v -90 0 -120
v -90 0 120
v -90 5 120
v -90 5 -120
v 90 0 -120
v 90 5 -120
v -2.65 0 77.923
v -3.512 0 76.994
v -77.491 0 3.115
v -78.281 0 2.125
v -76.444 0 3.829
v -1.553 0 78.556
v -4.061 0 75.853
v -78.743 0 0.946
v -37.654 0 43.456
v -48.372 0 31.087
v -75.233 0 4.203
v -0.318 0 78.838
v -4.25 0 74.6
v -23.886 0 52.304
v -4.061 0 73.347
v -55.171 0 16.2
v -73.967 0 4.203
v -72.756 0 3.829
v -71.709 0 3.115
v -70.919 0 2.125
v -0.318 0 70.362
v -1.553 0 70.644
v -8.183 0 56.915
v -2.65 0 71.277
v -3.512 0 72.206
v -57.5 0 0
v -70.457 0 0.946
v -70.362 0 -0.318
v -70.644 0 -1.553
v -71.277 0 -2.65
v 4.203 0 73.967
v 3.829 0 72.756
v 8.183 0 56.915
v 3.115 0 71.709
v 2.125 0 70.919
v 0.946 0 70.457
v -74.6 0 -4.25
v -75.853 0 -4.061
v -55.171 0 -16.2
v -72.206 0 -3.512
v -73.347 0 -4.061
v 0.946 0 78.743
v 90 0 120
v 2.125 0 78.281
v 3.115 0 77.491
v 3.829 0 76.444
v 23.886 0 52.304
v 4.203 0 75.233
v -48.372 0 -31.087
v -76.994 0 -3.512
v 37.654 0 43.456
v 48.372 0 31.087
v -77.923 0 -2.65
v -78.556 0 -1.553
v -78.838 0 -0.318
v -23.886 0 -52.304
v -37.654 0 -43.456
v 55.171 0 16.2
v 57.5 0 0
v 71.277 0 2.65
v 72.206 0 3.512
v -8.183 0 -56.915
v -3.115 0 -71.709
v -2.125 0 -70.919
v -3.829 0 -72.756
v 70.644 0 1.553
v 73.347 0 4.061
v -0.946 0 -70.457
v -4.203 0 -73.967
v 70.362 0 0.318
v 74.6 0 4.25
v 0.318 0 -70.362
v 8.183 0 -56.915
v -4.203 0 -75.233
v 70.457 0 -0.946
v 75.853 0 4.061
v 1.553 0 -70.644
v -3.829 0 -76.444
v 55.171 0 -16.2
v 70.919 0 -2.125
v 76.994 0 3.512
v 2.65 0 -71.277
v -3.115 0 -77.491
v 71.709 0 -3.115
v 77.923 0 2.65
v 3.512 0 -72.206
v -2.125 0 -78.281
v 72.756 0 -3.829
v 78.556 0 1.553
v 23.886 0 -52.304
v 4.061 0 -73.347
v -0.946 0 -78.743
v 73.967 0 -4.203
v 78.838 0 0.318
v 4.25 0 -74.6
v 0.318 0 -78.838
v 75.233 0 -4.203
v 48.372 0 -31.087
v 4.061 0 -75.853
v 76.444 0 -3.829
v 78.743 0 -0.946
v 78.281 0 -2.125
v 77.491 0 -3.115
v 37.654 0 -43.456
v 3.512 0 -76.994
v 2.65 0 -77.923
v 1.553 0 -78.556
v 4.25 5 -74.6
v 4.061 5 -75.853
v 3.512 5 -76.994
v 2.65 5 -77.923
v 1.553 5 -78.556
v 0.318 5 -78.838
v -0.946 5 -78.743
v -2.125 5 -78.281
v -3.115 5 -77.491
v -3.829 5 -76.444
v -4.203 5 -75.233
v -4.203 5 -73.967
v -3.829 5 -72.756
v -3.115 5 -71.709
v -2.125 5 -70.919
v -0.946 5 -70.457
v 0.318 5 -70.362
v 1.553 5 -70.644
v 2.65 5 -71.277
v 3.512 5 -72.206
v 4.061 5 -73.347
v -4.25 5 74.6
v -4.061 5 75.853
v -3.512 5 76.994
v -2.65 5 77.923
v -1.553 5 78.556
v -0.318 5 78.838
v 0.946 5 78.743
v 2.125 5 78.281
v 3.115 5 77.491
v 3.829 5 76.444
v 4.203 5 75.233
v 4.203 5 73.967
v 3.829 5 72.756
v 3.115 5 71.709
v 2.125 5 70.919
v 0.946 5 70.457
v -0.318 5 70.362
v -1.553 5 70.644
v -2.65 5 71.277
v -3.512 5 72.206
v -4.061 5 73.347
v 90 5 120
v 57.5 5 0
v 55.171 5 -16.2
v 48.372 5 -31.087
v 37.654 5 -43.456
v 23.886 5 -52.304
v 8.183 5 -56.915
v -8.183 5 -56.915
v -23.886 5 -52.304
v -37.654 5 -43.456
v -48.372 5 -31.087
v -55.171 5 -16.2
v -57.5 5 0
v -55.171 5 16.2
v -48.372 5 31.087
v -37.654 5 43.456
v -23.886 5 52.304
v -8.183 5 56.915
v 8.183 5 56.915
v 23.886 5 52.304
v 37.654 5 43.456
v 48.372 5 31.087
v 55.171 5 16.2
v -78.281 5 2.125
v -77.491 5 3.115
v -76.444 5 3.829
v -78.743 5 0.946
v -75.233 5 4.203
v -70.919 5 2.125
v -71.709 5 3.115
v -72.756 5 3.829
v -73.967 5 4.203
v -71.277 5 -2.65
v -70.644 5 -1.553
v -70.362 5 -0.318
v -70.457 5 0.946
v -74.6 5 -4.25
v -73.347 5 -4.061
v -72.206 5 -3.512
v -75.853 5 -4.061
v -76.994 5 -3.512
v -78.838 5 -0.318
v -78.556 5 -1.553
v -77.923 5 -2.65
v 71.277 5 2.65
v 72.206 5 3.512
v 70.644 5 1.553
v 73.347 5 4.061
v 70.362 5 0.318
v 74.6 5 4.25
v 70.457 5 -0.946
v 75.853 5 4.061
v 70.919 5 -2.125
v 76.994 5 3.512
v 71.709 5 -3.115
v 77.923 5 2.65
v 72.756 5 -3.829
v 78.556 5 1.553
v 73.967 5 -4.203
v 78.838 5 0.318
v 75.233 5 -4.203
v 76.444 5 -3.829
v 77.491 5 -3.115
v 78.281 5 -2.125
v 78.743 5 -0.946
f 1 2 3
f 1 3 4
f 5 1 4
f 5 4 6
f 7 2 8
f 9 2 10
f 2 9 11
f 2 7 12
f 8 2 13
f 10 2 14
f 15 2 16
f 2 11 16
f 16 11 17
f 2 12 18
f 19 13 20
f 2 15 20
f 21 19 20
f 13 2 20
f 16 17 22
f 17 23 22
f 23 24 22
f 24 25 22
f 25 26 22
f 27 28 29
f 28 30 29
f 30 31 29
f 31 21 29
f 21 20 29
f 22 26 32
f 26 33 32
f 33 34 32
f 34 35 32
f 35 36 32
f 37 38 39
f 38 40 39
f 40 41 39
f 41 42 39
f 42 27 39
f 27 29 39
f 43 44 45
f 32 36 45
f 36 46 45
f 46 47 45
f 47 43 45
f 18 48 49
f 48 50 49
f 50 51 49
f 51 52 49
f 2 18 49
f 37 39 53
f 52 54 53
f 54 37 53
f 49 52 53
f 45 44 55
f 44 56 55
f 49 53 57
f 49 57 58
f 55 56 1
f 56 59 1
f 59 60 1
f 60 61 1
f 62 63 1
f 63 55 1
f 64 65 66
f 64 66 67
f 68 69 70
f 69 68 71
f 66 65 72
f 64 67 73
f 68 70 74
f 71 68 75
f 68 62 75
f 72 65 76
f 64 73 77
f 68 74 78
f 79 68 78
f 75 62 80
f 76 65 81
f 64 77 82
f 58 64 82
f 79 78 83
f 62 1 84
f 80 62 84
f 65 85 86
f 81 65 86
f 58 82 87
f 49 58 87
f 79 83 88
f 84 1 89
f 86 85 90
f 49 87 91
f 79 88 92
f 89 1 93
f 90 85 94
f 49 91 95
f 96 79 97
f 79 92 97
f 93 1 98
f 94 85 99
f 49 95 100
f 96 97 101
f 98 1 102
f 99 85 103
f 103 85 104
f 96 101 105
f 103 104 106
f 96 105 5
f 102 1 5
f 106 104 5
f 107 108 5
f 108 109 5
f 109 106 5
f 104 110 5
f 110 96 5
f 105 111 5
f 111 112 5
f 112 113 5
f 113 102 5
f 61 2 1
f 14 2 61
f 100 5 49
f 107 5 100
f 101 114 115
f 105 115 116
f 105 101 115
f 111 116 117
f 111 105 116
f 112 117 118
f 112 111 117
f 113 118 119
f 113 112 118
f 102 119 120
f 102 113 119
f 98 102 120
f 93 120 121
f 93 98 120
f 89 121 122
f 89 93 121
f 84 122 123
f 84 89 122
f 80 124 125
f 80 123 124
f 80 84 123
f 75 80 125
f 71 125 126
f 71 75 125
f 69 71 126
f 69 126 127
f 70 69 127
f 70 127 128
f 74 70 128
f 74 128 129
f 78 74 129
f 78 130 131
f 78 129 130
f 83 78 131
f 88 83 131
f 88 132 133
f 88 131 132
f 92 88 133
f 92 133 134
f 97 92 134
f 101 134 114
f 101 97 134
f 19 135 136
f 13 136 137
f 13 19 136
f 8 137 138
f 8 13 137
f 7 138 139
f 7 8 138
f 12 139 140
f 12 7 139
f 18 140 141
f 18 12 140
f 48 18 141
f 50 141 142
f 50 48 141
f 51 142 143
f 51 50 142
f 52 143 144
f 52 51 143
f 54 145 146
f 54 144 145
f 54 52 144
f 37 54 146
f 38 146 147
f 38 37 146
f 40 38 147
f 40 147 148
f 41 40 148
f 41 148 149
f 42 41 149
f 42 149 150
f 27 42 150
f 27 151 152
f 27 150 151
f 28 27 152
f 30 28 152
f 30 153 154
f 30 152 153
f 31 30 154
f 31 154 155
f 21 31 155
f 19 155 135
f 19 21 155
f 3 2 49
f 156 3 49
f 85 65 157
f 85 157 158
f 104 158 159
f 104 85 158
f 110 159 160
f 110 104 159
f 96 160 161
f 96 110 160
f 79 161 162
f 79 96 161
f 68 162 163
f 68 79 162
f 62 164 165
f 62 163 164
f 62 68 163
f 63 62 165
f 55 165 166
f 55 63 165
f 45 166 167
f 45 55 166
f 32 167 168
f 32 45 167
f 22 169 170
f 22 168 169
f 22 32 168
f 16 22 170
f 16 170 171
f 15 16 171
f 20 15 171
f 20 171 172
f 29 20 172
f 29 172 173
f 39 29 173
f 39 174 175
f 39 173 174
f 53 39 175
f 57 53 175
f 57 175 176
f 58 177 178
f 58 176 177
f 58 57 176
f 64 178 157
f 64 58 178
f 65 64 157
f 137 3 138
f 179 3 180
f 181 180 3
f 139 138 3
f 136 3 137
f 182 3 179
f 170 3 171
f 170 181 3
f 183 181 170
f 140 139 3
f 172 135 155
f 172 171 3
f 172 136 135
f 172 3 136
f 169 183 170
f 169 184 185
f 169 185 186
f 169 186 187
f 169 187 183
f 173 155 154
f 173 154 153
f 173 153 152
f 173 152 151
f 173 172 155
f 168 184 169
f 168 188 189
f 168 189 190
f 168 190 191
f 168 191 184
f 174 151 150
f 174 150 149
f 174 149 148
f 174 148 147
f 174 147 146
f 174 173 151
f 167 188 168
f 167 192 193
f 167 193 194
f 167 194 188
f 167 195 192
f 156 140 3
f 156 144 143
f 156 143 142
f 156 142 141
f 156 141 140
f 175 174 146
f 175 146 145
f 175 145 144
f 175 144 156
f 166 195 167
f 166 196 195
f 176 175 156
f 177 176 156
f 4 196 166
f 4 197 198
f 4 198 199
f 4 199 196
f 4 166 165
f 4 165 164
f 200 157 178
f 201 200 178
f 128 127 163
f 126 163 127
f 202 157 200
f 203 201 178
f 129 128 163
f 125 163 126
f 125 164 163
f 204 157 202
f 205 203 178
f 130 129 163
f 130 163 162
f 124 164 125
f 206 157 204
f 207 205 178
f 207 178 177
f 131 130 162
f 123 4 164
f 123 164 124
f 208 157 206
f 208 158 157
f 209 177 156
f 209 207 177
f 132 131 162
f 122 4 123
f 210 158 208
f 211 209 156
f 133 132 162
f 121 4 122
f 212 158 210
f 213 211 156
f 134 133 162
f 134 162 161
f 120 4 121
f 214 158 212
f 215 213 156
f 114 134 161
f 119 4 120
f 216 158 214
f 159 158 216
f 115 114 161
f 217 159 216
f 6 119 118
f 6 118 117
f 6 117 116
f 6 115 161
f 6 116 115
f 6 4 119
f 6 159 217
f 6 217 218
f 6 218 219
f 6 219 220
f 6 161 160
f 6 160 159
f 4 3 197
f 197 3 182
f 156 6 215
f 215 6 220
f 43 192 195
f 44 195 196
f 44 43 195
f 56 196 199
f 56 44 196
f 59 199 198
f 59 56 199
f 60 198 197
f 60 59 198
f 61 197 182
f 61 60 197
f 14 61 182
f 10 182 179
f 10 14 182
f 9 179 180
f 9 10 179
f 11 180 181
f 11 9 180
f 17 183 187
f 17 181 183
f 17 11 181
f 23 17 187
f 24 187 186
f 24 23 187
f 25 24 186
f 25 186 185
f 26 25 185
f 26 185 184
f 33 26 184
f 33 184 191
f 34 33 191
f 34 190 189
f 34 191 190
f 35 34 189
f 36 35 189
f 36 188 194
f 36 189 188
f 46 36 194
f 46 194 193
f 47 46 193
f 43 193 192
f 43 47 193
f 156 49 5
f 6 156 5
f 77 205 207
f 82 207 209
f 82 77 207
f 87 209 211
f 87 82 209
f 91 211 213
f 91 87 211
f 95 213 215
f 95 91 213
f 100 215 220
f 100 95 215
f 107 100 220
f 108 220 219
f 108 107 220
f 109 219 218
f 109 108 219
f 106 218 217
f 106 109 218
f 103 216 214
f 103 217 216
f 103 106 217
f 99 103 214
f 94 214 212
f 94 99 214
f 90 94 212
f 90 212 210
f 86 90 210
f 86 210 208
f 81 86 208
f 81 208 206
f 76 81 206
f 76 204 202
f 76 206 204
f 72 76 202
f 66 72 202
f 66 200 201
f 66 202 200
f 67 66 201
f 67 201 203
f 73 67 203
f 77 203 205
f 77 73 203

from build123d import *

# Parameters (mm, degrees)
SZKIC1_W                    = 180
SZKIC1_H                    = 240
DODANIE_WYCI_GNI_CIE1_DEPTH = 5
SZKIC2_R                    = 57.5
SZKIC2_R_2                  = 4.25
WYTNIJ_WYCI_GNI_CIE1_DEPTH  = 43
SZYK_KO_OWY1_COUNT          = 4


with BuildPart() as part:
    # Szkic1 → Dodanie-wyciągnięcie1 (new body)
    with BuildSketch(Plane(origin=(0, 0, 0), x_dir=(1, 0, 0), z_dir=(0, 1, 0))):
        Rectangle(SZKIC1_W, SZKIC1_H)
    extrude(amount=DODANIE_WYCI_GNI_CIE1_DEPTH)

    # Szkic2 → Wytnij-wyciągnięcie1 (cut)
    with BuildSketch(Plane(origin=(0, 0, 0), x_dir=(1, 0, 0), z_dir=(0, 1, 0))):
        Circle(SZKIC2_R)
        with Locations((0, 74.6)):
            Circle(SZKIC2_R_2)
    wytnij_wyci_gni_cie1 = extrude(amount=WYTNIJ_WYCI_GNI_CIE1_DEPTH, mode=Mode.SUBTRACT)

    # Szyk kołowy1: Wytnij-wyciągnięcie1 ×4 about axis
    szyk_ko_owy1_axis = Axis((0, 0, 0), (0, 1, 0))
    for i in range(1, SZYK_KO_OWY1_COUNT):
        add(wytnij_wyci_gni_cie1.rotate(szyk_ko_owy1_axis, i * 360 / SZYK_KO_OWY1_COUNT), mode=Mode.SUBTRACT)


solid = part.part
